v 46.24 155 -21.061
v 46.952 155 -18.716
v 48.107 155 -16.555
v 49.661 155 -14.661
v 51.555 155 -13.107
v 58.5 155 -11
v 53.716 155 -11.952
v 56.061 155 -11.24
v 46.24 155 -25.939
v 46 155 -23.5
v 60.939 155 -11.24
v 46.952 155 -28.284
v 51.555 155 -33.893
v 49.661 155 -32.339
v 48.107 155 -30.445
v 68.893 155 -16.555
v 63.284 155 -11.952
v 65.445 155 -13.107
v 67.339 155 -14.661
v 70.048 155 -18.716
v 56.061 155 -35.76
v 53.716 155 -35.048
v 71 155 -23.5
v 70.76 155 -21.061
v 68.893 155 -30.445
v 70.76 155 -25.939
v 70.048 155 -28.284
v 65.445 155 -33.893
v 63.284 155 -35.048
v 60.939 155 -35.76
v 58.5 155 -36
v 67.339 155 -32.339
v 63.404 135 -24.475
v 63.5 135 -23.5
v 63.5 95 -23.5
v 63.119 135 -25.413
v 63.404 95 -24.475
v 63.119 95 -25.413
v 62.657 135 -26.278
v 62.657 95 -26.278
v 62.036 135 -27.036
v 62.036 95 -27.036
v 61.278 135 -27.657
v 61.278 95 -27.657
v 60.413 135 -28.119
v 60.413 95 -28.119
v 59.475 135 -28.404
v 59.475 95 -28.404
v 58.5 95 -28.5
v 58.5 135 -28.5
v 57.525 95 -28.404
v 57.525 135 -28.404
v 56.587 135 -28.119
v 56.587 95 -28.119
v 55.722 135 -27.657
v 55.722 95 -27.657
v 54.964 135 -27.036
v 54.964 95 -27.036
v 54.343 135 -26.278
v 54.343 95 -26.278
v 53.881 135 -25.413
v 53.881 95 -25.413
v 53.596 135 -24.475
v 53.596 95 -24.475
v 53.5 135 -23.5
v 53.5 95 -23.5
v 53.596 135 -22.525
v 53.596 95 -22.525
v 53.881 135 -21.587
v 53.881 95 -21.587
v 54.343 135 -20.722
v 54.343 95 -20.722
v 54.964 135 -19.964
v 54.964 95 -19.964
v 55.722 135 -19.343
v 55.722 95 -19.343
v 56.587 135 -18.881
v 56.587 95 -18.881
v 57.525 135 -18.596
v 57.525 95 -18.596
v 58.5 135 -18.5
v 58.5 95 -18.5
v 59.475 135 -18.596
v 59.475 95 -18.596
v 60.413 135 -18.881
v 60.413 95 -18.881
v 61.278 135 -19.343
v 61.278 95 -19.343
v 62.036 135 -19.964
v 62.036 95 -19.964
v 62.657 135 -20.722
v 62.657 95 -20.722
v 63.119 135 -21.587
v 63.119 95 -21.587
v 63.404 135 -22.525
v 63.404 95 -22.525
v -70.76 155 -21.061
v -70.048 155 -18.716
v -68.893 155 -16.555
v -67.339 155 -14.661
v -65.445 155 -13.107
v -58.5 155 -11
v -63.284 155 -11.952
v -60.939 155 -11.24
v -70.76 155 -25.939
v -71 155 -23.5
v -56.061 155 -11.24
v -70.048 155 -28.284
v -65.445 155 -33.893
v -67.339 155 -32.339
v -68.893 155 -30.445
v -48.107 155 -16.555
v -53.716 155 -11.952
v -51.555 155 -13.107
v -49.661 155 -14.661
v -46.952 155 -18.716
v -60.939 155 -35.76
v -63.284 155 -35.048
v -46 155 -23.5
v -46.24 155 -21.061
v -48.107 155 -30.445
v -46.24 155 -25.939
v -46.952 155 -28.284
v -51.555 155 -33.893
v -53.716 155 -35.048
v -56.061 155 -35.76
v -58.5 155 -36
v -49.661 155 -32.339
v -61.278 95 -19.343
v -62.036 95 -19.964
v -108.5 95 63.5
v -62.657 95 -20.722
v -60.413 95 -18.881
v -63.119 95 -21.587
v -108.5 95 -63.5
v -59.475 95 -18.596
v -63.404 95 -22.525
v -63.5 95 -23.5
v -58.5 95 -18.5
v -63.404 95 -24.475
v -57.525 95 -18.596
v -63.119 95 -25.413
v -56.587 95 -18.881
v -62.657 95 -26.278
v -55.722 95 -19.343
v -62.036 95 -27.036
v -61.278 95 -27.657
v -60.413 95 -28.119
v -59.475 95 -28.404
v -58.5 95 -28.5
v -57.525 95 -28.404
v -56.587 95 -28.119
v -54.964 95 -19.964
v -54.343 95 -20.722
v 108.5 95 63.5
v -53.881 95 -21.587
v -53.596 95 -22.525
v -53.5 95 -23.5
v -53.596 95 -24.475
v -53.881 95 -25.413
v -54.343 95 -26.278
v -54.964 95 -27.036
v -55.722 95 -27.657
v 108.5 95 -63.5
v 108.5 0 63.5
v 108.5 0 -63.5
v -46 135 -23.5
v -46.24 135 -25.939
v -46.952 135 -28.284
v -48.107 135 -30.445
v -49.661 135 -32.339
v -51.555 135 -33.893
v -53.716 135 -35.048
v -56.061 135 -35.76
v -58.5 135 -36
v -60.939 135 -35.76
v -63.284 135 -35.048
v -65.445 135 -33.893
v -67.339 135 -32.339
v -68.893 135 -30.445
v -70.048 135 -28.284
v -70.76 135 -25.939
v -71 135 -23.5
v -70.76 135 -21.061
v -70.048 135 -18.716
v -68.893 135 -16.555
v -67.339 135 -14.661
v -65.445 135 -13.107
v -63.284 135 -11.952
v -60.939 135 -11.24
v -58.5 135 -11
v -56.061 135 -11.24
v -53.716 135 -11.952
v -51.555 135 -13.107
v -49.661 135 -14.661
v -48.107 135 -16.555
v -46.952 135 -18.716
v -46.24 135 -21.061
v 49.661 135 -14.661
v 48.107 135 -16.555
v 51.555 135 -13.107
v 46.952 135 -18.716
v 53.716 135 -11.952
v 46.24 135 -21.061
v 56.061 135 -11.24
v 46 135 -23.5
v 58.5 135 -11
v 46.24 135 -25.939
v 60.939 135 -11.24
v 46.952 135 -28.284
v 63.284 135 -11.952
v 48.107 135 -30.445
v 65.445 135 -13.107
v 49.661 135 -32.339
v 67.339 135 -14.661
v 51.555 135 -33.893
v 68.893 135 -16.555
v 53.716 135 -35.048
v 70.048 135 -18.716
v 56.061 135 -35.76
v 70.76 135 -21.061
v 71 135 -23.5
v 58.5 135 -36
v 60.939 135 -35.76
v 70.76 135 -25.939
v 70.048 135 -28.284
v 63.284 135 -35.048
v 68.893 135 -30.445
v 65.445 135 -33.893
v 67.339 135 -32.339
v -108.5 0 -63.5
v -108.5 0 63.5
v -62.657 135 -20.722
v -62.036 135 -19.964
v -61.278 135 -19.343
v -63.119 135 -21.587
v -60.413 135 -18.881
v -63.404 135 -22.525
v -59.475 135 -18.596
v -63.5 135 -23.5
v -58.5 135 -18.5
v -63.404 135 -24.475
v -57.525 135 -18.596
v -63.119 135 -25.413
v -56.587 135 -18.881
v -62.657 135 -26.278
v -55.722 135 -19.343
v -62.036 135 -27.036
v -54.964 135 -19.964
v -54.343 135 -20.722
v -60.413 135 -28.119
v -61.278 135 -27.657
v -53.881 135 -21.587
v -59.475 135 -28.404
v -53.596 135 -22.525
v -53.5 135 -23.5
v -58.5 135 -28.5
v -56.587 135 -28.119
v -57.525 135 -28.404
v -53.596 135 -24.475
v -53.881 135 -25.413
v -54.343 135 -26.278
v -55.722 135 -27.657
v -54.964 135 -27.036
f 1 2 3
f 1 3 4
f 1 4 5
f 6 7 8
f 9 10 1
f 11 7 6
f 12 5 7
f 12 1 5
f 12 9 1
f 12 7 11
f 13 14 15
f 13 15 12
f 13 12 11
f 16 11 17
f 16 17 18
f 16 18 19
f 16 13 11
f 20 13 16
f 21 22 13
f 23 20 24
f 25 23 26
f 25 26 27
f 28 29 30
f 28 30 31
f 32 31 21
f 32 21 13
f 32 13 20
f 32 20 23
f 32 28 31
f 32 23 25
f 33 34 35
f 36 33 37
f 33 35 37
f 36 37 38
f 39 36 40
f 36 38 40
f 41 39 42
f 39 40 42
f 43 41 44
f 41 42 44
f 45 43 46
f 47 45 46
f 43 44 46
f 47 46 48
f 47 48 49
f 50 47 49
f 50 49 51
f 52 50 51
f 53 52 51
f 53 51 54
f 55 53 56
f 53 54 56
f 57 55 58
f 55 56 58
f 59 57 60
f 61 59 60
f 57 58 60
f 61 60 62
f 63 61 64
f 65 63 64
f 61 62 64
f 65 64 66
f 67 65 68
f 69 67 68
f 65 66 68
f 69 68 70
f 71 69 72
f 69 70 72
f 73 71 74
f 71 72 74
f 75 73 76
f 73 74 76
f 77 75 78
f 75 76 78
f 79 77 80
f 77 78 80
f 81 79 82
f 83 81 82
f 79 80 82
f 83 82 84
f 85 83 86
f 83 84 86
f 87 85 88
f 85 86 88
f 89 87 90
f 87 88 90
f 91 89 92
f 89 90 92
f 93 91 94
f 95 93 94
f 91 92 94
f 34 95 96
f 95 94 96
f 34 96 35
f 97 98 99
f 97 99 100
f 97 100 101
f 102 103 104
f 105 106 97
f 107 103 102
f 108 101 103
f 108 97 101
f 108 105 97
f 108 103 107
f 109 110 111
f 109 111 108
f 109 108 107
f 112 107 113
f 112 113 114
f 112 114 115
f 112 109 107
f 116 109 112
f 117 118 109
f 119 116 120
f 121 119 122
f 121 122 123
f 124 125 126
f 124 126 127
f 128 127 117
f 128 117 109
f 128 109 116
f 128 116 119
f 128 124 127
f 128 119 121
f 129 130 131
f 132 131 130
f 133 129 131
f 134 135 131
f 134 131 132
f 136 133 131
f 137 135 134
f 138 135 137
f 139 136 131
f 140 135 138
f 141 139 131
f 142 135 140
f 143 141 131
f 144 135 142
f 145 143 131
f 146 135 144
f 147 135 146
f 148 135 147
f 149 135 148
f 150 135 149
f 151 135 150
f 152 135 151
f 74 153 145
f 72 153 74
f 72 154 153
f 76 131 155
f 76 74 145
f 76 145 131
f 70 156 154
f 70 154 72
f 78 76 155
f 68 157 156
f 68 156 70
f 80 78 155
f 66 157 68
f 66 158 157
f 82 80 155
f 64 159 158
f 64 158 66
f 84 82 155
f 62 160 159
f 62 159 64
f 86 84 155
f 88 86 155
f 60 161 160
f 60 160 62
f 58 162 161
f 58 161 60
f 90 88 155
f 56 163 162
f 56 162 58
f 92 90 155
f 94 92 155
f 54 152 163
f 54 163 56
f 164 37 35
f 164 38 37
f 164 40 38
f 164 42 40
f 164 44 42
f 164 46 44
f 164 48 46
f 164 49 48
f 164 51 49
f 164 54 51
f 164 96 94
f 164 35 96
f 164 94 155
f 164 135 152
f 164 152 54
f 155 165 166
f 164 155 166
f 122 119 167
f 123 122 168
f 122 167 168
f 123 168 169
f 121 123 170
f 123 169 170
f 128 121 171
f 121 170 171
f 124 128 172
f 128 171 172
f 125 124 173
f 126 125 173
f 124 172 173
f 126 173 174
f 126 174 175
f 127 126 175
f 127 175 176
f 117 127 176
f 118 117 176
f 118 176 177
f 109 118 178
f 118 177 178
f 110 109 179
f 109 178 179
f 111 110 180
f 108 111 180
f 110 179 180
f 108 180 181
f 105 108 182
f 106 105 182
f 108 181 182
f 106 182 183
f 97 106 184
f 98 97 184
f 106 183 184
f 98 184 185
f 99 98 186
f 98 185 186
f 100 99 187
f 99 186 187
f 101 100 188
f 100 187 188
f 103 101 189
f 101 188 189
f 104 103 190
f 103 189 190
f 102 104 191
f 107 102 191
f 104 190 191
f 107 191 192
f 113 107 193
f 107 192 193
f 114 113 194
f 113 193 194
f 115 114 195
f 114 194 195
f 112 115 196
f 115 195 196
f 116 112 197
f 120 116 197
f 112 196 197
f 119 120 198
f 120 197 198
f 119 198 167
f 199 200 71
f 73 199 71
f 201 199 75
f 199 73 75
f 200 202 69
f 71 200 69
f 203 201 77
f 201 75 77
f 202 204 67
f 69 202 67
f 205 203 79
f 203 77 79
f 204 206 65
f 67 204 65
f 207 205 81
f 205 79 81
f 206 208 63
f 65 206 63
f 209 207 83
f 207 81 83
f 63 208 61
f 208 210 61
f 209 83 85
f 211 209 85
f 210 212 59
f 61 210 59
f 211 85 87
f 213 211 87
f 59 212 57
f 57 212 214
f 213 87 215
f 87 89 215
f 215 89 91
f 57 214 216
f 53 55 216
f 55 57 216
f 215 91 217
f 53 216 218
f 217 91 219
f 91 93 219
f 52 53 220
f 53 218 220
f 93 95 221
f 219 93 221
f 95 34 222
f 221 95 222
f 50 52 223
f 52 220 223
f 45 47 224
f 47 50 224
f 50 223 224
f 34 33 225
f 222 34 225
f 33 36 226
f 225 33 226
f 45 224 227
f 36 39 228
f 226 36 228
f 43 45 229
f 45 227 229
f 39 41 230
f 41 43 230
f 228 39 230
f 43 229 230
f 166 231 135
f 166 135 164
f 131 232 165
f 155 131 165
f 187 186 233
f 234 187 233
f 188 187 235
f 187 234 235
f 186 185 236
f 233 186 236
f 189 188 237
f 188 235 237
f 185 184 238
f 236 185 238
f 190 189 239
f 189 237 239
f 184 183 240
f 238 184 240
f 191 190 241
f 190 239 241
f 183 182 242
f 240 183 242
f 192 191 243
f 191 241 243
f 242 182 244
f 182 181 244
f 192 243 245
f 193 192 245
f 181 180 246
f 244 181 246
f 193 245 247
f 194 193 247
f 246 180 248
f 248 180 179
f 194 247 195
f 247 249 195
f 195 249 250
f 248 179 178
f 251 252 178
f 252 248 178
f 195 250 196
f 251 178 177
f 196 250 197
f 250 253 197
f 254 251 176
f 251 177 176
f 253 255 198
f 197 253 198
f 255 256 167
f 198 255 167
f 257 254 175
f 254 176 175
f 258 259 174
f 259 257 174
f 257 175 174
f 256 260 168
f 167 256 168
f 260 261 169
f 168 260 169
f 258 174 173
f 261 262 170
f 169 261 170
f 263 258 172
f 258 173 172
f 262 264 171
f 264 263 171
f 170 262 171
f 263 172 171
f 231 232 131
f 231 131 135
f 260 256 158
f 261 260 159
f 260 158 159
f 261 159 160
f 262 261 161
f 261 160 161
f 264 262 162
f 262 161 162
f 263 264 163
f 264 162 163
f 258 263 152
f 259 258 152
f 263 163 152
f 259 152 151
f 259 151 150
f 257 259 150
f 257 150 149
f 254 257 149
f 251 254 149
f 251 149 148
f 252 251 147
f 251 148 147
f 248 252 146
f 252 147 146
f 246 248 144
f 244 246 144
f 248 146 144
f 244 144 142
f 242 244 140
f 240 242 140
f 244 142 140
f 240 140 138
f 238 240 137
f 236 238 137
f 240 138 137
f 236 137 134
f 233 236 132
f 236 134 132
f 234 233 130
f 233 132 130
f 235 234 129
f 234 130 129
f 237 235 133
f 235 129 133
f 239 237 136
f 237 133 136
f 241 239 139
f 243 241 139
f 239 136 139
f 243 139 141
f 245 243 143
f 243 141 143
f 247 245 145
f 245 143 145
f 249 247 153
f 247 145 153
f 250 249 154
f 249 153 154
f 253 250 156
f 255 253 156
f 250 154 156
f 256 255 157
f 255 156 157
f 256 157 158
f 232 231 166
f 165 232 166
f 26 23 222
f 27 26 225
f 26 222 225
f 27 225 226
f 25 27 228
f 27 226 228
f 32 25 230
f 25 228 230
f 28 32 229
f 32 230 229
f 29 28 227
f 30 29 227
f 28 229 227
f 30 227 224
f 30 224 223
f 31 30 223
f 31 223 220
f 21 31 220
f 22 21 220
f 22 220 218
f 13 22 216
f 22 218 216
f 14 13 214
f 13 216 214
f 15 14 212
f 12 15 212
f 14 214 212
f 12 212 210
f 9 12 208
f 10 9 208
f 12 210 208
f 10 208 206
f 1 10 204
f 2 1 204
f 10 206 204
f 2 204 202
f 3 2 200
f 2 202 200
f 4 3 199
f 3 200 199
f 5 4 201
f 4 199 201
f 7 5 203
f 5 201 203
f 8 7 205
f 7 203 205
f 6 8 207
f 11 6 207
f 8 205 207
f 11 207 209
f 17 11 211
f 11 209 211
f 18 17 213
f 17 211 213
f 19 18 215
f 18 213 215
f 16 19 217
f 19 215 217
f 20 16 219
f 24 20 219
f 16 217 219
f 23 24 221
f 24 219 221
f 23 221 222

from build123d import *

# Parameters (mm, degrees)
SKETCH1_W           = 217
SKETCH1_H           = 127
BOSS_EXTRUDE1_DEPTH = 95
SKETCH2_R           = 5
BOSS_EXTRUDE2_DEPTH = 40
SKETCH3_R           = 12.5
BOSS_EXTRUDE3_DEPTH = 20


with BuildPart() as part:
    # Sketch1 → Boss-Extrude1 (new body)
    with BuildSketch(Plane(origin=(0, 0, 0), x_dir=(1, 0, 0), z_dir=(0, 1, 0))):
        Rectangle(SKETCH1_W, SKETCH1_H)
    extrude(amount=BOSS_EXTRUDE1_DEPTH)

    # Sketch2 → Boss-Extrude2 (add)
    with BuildSketch(Plane(origin=(0, 95, 0), x_dir=(1, 0, 0), z_dir=(0, 1, 0))):
        with Locations((-58.5, 23.5)):
            Circle(SKETCH2_R)
        with Locations((58.5, 23.5)):
            Circle(SKETCH2_R)
    extrude(amount=BOSS_EXTRUDE2_DEPTH)

    # Sketch3 → Boss-Extrude3 (add)
    with BuildSketch(Plane(origin=(0, 135, 0), x_dir=(1, 0, 0), z_dir=(0, 1, 0))):
        with Locations((-58.5, 23.5)):
            Circle(SKETCH3_R)
        with Locations((58.5, 23.5)):
            Circle(SKETCH3_R)
    extrude(amount=BOSS_EXTRUDE3_DEPTH)


solid = part.part
